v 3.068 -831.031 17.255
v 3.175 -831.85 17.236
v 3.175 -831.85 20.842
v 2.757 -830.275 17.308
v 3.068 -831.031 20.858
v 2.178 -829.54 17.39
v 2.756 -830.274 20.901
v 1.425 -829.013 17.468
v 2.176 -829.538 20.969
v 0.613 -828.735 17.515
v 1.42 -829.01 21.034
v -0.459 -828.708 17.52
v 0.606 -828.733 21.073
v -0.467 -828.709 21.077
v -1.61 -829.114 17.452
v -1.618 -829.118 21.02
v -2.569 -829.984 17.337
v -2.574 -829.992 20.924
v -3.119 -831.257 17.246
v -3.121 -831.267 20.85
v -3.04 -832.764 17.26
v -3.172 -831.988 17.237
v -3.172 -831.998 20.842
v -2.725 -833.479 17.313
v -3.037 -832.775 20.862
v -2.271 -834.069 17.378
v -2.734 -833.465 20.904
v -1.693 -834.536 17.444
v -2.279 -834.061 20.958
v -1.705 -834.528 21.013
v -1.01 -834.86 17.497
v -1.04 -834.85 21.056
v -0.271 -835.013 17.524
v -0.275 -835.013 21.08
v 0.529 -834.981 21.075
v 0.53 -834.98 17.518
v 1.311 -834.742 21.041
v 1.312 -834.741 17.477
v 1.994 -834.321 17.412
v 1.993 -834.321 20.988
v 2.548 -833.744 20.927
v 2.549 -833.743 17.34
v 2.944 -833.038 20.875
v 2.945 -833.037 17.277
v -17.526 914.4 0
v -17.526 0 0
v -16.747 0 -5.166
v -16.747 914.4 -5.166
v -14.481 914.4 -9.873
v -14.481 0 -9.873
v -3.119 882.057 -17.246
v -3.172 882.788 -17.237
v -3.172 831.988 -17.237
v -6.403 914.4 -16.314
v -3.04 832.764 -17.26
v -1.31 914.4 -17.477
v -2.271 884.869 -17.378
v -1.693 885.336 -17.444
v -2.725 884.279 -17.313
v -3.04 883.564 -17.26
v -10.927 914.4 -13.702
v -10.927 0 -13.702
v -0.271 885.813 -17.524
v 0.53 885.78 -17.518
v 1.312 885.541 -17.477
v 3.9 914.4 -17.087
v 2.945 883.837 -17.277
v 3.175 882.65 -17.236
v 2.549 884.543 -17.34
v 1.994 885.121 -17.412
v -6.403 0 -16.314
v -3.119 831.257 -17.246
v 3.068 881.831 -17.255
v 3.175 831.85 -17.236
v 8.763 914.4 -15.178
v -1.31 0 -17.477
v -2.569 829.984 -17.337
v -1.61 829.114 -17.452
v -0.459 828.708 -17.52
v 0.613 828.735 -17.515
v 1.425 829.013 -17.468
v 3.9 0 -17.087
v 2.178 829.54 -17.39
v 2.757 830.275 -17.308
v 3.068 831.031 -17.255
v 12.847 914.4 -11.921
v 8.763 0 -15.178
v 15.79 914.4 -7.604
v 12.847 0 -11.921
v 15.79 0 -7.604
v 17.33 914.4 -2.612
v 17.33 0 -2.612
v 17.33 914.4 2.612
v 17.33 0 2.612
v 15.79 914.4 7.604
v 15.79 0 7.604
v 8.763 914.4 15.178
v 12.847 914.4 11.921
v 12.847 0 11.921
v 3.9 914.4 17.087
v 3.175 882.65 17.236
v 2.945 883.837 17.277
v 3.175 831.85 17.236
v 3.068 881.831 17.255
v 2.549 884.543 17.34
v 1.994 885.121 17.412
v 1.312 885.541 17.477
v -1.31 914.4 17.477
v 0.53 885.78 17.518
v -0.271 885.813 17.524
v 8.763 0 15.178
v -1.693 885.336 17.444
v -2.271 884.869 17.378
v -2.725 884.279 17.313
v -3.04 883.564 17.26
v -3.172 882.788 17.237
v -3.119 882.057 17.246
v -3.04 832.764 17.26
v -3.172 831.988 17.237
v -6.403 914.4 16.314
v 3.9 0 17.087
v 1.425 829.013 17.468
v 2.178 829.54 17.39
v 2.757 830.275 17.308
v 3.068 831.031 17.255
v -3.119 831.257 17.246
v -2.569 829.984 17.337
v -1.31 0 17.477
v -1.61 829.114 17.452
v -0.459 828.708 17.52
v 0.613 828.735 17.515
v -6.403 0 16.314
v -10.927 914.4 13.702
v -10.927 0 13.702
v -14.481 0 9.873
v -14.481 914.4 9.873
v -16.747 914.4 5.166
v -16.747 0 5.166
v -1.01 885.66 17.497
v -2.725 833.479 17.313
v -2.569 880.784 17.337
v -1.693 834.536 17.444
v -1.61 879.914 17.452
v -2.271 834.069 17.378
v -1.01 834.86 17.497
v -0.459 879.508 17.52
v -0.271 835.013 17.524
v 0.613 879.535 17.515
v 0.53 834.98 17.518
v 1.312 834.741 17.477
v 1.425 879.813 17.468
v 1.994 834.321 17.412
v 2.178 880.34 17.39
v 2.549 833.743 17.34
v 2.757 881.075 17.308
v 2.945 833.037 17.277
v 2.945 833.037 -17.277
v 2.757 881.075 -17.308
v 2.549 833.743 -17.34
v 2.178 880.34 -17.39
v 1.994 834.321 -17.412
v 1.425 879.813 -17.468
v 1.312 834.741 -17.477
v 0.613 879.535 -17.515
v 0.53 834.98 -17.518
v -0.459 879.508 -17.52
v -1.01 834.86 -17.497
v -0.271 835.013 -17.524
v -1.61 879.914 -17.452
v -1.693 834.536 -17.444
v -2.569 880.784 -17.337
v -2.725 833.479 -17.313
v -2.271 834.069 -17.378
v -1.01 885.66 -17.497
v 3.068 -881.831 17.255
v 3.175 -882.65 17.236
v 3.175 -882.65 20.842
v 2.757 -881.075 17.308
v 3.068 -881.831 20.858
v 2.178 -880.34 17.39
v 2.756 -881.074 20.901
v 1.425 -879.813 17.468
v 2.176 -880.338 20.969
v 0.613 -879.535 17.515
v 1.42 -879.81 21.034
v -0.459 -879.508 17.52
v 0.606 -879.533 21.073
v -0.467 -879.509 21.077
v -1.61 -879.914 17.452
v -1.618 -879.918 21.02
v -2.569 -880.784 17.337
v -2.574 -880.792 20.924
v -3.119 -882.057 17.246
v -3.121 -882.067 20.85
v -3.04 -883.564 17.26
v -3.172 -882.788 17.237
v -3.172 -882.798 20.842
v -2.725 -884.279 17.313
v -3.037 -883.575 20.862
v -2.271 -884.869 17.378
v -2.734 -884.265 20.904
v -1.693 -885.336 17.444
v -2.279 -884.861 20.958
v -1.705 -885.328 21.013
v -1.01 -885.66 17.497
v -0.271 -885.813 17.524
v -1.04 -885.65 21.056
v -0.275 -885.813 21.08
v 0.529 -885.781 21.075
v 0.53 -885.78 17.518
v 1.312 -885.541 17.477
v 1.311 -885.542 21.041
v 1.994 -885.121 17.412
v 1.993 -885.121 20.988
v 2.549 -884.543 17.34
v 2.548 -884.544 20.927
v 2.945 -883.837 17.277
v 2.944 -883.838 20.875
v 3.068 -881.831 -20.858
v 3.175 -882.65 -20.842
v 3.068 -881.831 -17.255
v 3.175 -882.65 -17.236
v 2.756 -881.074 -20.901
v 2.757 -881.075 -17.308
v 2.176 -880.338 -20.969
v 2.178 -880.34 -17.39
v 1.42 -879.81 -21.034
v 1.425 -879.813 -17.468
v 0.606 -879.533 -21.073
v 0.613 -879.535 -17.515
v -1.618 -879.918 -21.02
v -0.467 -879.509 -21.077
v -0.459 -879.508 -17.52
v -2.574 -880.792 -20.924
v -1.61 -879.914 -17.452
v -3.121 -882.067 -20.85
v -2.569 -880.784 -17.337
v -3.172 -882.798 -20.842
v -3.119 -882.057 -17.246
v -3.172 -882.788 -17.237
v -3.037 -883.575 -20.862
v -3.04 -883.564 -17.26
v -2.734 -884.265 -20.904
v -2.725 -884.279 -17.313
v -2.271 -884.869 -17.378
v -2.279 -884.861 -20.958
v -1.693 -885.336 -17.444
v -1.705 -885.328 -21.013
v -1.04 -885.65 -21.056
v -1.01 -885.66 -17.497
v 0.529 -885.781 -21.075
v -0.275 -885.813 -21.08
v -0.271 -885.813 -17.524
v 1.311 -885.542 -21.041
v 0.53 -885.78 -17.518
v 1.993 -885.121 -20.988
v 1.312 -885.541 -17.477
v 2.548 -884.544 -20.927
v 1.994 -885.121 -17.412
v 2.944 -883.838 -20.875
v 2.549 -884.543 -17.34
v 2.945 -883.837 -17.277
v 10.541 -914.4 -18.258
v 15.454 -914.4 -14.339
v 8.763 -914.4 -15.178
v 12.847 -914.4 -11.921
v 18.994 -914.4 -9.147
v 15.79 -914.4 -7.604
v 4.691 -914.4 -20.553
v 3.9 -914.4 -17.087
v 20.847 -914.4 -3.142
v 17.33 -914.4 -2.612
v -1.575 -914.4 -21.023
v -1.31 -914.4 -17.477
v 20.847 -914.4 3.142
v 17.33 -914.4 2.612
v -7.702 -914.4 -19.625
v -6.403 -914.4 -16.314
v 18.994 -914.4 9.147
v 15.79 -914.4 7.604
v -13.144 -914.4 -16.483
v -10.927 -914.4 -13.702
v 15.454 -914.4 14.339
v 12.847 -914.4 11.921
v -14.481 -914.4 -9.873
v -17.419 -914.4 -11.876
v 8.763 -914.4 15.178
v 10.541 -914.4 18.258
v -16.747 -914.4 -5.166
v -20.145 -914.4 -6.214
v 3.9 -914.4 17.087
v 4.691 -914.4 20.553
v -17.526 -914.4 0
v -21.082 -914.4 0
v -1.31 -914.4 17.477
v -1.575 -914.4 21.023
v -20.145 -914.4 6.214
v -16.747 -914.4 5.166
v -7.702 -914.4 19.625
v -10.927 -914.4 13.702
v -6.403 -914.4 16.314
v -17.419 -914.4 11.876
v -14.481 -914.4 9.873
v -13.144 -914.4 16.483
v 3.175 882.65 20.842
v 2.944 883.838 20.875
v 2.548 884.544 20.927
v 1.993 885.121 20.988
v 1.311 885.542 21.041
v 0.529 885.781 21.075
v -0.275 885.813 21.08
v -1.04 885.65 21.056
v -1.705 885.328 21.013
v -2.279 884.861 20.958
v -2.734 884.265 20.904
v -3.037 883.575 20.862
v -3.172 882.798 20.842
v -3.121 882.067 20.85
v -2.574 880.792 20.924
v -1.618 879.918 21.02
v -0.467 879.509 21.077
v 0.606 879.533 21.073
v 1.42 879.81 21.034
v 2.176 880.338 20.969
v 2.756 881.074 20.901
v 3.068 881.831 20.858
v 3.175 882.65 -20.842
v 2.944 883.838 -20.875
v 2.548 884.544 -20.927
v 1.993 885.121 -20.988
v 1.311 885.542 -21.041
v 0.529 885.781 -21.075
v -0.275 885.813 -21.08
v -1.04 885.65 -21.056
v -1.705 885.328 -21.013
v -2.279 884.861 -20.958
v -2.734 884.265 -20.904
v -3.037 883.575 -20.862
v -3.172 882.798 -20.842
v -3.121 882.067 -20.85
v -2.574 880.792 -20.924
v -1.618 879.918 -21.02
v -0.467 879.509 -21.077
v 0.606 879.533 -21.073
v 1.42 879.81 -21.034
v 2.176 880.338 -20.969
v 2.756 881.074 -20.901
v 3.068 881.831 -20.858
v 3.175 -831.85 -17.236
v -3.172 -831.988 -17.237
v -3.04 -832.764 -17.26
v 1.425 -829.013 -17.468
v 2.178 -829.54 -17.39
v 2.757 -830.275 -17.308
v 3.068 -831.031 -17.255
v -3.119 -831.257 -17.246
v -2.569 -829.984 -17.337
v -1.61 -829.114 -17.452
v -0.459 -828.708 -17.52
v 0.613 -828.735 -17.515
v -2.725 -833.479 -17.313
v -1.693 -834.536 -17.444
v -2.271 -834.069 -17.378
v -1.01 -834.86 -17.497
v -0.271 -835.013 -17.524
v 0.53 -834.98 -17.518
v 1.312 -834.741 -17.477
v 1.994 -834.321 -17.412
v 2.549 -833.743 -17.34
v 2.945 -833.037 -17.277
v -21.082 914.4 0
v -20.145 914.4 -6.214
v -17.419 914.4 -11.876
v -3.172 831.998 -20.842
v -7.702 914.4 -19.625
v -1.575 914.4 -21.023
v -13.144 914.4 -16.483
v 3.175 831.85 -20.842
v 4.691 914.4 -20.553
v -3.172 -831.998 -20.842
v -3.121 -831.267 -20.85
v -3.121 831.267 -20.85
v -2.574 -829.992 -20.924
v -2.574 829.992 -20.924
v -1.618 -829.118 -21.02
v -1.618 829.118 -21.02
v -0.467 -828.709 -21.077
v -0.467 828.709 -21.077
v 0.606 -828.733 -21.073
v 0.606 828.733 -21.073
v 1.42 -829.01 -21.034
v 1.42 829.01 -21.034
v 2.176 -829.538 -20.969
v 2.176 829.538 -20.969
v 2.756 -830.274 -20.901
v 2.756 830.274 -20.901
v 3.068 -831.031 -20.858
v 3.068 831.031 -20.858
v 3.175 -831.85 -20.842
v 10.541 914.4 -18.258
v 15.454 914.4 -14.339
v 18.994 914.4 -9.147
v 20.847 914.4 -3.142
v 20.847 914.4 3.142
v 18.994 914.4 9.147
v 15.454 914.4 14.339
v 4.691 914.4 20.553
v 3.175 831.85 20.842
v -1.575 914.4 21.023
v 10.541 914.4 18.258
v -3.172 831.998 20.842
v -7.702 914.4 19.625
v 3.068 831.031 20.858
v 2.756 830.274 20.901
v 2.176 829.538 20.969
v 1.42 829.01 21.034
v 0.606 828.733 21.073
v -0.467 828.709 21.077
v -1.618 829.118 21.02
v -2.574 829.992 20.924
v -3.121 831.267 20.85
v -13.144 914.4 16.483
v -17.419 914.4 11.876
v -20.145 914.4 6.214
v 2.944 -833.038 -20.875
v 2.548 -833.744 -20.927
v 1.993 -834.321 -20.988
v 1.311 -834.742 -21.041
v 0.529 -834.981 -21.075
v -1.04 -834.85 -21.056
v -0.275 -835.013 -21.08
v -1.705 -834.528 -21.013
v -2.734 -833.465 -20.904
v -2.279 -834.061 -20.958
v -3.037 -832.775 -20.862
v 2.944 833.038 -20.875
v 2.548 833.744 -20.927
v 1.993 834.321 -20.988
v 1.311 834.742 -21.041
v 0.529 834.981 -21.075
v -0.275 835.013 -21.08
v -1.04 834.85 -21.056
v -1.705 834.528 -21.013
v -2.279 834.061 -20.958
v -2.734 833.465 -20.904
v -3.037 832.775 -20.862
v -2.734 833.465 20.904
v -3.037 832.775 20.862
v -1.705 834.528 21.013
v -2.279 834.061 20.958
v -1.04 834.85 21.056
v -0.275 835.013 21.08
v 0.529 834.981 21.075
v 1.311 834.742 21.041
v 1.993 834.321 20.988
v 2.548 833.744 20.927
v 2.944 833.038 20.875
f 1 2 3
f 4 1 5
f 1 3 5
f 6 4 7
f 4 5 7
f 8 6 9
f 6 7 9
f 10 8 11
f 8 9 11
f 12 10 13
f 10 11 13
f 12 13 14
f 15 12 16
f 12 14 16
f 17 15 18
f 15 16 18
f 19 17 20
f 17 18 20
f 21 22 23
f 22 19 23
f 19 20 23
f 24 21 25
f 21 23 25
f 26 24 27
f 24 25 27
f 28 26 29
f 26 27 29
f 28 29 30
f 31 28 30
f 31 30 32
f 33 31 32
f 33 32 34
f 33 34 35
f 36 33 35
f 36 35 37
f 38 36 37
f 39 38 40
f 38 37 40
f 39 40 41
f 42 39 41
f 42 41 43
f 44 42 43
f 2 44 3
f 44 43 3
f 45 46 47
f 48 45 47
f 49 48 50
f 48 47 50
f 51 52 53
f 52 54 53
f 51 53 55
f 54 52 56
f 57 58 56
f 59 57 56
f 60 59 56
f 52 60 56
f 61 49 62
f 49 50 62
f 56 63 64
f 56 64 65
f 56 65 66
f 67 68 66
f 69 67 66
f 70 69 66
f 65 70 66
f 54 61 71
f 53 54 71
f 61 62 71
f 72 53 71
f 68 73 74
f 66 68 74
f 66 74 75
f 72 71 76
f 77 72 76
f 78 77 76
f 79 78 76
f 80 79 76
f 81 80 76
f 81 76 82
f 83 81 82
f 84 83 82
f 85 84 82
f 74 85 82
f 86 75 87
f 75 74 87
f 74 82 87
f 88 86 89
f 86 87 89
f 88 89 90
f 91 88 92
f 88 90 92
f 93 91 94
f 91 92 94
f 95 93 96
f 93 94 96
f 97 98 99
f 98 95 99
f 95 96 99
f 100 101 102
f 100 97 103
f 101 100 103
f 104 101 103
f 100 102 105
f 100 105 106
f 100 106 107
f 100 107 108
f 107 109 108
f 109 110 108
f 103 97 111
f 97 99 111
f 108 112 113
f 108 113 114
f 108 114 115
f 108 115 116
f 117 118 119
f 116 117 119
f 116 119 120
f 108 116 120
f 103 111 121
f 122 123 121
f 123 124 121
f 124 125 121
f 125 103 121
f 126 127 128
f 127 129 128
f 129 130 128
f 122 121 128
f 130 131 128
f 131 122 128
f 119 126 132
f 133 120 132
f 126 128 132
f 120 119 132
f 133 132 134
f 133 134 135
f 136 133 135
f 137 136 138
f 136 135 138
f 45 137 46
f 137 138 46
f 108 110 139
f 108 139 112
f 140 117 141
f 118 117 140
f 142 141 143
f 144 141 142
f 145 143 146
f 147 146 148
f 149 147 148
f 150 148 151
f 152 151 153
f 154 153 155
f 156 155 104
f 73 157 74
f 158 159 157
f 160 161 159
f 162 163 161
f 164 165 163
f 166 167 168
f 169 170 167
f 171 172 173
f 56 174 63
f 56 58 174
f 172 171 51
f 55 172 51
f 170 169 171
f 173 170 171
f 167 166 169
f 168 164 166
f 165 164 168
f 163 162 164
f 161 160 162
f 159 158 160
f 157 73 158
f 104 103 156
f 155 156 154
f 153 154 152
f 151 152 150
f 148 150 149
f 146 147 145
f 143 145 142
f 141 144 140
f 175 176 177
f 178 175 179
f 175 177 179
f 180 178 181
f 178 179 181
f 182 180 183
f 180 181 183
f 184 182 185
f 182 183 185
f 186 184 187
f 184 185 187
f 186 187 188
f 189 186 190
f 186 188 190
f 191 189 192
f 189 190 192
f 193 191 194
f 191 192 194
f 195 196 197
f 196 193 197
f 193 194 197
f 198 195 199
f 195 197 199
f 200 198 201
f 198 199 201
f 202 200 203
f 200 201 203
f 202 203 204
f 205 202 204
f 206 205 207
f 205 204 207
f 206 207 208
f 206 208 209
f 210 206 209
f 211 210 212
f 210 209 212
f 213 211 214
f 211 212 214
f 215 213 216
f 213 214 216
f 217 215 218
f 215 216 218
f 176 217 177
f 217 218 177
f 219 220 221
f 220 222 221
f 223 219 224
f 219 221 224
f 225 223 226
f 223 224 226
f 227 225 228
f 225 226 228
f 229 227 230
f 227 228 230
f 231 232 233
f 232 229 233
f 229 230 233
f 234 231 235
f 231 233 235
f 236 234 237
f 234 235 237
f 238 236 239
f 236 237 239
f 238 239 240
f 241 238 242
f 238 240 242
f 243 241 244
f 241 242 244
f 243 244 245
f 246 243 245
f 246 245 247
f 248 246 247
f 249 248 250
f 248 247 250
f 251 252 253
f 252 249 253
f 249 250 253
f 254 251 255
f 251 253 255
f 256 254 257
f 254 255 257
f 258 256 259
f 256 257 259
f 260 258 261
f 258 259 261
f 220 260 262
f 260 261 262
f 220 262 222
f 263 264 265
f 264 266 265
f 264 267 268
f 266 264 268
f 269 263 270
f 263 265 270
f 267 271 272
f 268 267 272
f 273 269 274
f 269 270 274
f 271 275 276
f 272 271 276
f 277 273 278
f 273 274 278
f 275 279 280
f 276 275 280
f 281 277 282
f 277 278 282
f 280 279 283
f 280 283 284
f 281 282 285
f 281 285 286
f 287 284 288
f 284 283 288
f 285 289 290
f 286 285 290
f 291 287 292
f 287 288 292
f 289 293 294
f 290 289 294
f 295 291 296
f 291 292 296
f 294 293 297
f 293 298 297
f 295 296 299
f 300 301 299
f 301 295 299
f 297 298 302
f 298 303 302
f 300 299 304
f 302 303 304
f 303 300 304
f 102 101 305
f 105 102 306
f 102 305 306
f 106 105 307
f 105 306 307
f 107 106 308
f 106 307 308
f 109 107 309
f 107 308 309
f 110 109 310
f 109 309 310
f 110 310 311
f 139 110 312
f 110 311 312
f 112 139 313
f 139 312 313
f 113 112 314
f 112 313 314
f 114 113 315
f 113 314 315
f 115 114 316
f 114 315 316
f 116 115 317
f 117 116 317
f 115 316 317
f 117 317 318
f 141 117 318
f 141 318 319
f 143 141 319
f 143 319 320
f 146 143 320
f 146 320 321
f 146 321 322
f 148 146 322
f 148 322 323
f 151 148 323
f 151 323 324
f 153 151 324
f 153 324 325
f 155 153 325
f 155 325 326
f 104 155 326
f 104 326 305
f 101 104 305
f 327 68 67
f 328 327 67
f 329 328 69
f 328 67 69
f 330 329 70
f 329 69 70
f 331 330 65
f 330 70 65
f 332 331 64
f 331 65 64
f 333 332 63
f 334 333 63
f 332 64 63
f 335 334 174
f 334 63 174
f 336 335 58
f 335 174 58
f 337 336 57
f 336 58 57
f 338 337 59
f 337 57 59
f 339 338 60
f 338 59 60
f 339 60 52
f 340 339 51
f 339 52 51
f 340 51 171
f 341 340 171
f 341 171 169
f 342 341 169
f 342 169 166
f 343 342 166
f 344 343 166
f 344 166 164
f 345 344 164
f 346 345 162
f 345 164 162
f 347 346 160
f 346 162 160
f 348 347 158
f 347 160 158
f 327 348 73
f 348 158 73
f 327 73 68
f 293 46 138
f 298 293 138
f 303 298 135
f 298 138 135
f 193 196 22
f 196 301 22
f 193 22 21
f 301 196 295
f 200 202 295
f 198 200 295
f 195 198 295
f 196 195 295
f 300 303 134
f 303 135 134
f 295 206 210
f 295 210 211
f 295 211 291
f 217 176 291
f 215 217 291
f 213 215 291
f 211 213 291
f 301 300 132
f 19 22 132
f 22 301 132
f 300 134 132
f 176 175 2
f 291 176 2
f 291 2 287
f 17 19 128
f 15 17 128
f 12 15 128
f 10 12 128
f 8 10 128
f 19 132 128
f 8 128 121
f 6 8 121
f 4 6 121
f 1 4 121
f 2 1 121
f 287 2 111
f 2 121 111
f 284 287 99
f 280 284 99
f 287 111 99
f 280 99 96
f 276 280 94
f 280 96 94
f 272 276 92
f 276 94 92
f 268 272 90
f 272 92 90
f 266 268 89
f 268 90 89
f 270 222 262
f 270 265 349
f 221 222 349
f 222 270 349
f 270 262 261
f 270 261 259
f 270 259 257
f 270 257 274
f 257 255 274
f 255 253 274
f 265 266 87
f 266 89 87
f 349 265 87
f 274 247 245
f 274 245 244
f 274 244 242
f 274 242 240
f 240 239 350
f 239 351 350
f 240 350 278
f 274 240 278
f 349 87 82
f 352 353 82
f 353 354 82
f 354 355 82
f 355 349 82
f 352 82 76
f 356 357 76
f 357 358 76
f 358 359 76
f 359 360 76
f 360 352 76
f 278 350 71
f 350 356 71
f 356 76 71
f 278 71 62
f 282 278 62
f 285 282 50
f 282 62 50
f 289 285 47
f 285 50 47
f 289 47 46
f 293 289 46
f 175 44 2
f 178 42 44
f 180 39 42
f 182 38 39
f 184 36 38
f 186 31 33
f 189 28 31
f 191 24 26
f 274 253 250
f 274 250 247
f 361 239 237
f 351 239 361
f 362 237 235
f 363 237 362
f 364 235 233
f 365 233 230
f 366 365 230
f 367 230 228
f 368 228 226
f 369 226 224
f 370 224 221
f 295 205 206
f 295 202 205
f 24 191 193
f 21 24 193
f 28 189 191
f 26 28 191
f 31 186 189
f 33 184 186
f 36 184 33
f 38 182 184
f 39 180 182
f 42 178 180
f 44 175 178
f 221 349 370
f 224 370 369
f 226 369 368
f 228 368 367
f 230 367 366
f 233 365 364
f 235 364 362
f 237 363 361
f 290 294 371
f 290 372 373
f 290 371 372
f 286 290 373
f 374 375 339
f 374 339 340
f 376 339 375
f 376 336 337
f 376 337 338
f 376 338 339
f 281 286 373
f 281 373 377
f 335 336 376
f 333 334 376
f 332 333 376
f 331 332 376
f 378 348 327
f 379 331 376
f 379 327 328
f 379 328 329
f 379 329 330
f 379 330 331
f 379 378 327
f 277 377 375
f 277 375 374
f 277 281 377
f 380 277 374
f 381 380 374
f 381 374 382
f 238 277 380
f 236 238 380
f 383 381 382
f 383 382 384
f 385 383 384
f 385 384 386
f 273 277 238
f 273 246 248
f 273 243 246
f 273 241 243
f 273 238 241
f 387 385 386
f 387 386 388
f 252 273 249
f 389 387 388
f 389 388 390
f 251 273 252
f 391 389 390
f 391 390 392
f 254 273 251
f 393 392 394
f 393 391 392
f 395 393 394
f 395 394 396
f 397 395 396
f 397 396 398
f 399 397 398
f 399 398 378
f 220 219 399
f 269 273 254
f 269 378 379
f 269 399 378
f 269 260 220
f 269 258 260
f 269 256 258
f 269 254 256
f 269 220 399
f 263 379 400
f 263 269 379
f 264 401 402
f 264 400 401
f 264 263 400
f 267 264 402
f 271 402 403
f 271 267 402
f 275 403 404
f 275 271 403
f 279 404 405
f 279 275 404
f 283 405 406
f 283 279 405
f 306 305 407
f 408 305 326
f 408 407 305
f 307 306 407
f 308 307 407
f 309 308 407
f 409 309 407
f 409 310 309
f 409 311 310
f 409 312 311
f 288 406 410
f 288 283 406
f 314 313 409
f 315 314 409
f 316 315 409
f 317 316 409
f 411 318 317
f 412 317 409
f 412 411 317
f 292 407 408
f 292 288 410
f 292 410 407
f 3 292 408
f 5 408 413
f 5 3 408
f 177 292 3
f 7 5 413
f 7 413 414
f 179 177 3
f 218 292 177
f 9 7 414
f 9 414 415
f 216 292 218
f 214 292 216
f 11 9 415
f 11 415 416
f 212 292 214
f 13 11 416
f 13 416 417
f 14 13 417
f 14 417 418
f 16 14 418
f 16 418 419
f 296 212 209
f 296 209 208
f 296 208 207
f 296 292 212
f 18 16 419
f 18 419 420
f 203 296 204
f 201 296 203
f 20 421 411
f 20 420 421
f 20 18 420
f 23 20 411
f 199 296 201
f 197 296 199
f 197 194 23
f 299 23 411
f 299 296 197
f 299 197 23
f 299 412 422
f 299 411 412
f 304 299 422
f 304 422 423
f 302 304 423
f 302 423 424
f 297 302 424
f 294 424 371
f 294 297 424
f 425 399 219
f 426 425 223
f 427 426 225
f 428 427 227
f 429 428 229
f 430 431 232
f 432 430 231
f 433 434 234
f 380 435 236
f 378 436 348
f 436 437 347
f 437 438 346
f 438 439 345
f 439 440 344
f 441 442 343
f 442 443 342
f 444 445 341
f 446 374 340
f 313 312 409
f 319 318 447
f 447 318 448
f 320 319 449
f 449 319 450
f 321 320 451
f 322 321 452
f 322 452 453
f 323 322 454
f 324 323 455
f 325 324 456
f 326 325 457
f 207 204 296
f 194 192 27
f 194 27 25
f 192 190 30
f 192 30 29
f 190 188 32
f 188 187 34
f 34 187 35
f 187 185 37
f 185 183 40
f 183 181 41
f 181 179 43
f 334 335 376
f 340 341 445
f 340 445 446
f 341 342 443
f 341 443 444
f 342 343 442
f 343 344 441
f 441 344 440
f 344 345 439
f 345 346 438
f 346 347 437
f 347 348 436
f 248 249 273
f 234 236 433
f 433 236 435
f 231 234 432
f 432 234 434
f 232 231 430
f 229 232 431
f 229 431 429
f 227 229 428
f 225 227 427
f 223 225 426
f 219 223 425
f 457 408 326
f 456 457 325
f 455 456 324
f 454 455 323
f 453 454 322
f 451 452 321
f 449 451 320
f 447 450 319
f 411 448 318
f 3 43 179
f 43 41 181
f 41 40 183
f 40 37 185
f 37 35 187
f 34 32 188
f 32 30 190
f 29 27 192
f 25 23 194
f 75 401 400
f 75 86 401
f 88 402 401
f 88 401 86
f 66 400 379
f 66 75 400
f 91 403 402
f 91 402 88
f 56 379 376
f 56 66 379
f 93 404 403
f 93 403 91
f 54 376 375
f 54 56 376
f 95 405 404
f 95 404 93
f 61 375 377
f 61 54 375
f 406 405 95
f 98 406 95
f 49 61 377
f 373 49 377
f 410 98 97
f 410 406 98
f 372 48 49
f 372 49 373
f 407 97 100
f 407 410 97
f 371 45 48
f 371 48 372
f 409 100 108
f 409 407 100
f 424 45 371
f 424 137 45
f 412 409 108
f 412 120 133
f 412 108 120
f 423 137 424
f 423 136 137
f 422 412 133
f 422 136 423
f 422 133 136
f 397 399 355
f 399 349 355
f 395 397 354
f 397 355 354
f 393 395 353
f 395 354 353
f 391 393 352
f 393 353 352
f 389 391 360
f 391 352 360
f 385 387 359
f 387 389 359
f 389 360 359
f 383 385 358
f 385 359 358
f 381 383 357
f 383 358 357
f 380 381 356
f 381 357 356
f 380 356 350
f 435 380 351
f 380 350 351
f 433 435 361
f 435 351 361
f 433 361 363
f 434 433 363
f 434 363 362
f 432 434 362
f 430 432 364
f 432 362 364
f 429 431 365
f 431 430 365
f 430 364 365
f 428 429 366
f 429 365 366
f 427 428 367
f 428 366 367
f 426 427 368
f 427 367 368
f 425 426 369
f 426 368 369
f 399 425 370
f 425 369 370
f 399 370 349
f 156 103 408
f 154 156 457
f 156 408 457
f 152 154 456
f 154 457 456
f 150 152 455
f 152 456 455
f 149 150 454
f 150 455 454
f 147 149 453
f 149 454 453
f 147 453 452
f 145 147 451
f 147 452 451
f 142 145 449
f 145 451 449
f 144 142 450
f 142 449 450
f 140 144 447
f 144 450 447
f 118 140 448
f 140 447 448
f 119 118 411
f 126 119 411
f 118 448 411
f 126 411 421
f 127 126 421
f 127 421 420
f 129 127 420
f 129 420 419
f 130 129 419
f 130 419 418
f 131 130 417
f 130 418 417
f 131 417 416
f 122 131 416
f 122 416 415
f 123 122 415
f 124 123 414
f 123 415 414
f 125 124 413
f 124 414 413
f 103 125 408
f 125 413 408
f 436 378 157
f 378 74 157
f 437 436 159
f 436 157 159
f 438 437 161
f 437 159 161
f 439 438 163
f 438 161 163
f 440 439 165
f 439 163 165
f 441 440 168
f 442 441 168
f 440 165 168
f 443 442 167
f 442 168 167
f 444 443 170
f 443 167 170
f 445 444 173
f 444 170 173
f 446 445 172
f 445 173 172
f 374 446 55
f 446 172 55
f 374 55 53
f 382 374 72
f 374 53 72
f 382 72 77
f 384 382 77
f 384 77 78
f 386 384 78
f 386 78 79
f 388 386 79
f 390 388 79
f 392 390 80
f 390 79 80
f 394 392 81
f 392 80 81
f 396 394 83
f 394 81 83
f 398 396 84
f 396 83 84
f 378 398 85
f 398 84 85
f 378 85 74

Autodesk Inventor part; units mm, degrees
ref_plane "YZ Plane" through (0, 0, 0) normal (1, 0, 0) x (0, 1, 0)
ref_plane "XZ Plane" through (0, 0, 0) normal (0, 1, 0) x (-1, 0, 0)
ref_plane "XY Plane" through (0, 0, 0) normal (0, 0, 1) x (1, 0, 0)
sketch "Sketch1" plane through (0, 0, 0) normal (0, 1, 0) x (-1, 0, 0)
  circle A0 centre (0, 0) radius 21.082
  circle A1 centre (0, 0) radius 17.526
  dimension "d0" = 42.164
  dimension "d1" = 35.052
extrude "Extrusion1" add sketch "Sketch1" along normal mid plane 1828.8
sketch "Sketch3" plane through (0, 0, 0) normal (0, 0, 1) x (1, 0, 0)
  circle A0 centre (0, 882.65) radius 3.175
  circle A1 centre (0, 831.85) radius 3.175
  line L0 (21.082, 914.4) -> (-21.082, 914.4) projected
  point P0 (0, 0)
  dimension "d10" = 31.75
  dimension "d11" = 82.55
  dimension "d12" = 6.35
extrude "Extrusion3" cut sketch "Sketch3" against normal through all both and the other way through all
mirror "Mirror1" about plane through (0, 0, 0) normal (0, 1, 0) of "Extrusion3"
properties part number "FE-110-003 Top Bar" material "Aluminum 6061"
